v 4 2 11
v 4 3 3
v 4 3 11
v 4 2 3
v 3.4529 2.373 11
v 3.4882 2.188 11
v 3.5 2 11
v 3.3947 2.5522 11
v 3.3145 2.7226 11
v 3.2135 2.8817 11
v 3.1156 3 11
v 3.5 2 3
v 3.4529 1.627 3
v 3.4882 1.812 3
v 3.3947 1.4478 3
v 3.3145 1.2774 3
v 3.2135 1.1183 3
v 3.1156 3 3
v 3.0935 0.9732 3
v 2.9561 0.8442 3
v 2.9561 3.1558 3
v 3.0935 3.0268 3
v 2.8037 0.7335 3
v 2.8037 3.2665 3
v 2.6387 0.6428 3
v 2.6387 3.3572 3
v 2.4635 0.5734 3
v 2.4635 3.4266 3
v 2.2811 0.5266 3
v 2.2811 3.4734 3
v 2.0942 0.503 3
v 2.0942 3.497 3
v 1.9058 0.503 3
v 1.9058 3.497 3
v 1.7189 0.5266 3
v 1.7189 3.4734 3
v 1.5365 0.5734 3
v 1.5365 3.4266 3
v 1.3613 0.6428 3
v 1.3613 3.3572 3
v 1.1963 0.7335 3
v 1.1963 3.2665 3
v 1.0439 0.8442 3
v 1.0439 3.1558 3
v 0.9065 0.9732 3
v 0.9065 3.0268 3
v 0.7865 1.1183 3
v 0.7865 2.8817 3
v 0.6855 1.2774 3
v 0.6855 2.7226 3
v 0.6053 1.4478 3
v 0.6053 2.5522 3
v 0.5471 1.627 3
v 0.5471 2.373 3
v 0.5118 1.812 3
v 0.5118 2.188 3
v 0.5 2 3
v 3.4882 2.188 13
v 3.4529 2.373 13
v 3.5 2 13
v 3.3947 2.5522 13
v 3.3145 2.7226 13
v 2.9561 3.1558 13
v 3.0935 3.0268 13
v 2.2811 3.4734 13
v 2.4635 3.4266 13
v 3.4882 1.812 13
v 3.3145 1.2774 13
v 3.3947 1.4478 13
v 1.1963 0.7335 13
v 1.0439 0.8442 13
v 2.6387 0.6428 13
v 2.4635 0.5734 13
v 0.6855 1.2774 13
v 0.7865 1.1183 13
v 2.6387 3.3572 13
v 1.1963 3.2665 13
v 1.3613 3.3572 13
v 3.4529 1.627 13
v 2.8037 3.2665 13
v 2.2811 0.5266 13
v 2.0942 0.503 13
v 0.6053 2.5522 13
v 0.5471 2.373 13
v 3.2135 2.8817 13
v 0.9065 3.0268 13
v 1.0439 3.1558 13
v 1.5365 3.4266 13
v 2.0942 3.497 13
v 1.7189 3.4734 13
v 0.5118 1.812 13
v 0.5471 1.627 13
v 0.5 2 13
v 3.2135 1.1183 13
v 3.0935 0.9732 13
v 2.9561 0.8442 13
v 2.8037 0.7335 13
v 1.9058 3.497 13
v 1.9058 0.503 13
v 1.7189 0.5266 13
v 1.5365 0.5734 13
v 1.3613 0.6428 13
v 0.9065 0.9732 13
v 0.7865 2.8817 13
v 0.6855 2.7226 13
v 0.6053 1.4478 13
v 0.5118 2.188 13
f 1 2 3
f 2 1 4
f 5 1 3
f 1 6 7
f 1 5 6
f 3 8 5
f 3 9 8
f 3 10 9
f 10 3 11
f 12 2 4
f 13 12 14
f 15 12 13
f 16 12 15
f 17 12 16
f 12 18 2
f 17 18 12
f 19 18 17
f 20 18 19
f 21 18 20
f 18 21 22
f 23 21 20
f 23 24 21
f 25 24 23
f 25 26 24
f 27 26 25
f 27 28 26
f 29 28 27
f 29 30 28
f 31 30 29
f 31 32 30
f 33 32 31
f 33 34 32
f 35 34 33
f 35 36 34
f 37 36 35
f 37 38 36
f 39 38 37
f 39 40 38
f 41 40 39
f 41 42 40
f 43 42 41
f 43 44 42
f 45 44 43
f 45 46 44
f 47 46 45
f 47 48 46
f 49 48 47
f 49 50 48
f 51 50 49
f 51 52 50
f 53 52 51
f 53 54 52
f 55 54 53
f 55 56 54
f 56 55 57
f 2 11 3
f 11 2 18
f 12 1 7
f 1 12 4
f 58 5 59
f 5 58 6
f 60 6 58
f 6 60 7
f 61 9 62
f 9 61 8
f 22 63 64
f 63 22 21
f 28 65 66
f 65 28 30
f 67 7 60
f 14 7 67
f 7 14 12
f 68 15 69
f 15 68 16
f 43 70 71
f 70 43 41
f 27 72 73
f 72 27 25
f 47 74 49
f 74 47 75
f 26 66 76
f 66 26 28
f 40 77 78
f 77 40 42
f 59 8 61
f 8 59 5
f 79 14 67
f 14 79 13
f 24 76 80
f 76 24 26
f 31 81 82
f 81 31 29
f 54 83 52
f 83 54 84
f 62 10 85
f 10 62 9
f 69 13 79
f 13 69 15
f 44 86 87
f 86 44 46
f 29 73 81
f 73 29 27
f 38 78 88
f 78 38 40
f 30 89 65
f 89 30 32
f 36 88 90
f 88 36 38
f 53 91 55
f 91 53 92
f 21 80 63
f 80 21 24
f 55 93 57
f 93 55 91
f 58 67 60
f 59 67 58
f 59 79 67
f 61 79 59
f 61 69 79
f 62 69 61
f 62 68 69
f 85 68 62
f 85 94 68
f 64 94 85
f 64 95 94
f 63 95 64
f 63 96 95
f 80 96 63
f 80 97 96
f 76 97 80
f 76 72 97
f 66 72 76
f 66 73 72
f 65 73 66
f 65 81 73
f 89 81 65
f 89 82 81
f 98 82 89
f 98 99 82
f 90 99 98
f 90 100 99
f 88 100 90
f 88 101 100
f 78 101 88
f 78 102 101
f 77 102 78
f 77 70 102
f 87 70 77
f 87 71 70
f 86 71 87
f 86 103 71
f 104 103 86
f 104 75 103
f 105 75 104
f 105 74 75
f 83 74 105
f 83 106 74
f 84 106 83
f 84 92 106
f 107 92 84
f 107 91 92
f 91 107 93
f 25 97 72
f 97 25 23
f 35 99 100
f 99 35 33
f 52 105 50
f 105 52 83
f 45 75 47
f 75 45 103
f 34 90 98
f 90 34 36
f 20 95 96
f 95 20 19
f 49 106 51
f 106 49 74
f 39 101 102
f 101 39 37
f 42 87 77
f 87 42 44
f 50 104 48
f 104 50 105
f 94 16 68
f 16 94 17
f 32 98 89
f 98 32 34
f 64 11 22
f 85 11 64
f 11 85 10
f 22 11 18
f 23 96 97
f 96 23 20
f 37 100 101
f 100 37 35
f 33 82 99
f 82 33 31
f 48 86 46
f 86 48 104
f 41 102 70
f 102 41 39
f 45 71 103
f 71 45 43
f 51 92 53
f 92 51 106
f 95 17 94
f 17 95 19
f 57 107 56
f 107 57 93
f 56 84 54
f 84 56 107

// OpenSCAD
$fn=50;
translate([2,2,3])
{
	cube([2,1,8]);
	cylinder(h=10,d=3);
}
